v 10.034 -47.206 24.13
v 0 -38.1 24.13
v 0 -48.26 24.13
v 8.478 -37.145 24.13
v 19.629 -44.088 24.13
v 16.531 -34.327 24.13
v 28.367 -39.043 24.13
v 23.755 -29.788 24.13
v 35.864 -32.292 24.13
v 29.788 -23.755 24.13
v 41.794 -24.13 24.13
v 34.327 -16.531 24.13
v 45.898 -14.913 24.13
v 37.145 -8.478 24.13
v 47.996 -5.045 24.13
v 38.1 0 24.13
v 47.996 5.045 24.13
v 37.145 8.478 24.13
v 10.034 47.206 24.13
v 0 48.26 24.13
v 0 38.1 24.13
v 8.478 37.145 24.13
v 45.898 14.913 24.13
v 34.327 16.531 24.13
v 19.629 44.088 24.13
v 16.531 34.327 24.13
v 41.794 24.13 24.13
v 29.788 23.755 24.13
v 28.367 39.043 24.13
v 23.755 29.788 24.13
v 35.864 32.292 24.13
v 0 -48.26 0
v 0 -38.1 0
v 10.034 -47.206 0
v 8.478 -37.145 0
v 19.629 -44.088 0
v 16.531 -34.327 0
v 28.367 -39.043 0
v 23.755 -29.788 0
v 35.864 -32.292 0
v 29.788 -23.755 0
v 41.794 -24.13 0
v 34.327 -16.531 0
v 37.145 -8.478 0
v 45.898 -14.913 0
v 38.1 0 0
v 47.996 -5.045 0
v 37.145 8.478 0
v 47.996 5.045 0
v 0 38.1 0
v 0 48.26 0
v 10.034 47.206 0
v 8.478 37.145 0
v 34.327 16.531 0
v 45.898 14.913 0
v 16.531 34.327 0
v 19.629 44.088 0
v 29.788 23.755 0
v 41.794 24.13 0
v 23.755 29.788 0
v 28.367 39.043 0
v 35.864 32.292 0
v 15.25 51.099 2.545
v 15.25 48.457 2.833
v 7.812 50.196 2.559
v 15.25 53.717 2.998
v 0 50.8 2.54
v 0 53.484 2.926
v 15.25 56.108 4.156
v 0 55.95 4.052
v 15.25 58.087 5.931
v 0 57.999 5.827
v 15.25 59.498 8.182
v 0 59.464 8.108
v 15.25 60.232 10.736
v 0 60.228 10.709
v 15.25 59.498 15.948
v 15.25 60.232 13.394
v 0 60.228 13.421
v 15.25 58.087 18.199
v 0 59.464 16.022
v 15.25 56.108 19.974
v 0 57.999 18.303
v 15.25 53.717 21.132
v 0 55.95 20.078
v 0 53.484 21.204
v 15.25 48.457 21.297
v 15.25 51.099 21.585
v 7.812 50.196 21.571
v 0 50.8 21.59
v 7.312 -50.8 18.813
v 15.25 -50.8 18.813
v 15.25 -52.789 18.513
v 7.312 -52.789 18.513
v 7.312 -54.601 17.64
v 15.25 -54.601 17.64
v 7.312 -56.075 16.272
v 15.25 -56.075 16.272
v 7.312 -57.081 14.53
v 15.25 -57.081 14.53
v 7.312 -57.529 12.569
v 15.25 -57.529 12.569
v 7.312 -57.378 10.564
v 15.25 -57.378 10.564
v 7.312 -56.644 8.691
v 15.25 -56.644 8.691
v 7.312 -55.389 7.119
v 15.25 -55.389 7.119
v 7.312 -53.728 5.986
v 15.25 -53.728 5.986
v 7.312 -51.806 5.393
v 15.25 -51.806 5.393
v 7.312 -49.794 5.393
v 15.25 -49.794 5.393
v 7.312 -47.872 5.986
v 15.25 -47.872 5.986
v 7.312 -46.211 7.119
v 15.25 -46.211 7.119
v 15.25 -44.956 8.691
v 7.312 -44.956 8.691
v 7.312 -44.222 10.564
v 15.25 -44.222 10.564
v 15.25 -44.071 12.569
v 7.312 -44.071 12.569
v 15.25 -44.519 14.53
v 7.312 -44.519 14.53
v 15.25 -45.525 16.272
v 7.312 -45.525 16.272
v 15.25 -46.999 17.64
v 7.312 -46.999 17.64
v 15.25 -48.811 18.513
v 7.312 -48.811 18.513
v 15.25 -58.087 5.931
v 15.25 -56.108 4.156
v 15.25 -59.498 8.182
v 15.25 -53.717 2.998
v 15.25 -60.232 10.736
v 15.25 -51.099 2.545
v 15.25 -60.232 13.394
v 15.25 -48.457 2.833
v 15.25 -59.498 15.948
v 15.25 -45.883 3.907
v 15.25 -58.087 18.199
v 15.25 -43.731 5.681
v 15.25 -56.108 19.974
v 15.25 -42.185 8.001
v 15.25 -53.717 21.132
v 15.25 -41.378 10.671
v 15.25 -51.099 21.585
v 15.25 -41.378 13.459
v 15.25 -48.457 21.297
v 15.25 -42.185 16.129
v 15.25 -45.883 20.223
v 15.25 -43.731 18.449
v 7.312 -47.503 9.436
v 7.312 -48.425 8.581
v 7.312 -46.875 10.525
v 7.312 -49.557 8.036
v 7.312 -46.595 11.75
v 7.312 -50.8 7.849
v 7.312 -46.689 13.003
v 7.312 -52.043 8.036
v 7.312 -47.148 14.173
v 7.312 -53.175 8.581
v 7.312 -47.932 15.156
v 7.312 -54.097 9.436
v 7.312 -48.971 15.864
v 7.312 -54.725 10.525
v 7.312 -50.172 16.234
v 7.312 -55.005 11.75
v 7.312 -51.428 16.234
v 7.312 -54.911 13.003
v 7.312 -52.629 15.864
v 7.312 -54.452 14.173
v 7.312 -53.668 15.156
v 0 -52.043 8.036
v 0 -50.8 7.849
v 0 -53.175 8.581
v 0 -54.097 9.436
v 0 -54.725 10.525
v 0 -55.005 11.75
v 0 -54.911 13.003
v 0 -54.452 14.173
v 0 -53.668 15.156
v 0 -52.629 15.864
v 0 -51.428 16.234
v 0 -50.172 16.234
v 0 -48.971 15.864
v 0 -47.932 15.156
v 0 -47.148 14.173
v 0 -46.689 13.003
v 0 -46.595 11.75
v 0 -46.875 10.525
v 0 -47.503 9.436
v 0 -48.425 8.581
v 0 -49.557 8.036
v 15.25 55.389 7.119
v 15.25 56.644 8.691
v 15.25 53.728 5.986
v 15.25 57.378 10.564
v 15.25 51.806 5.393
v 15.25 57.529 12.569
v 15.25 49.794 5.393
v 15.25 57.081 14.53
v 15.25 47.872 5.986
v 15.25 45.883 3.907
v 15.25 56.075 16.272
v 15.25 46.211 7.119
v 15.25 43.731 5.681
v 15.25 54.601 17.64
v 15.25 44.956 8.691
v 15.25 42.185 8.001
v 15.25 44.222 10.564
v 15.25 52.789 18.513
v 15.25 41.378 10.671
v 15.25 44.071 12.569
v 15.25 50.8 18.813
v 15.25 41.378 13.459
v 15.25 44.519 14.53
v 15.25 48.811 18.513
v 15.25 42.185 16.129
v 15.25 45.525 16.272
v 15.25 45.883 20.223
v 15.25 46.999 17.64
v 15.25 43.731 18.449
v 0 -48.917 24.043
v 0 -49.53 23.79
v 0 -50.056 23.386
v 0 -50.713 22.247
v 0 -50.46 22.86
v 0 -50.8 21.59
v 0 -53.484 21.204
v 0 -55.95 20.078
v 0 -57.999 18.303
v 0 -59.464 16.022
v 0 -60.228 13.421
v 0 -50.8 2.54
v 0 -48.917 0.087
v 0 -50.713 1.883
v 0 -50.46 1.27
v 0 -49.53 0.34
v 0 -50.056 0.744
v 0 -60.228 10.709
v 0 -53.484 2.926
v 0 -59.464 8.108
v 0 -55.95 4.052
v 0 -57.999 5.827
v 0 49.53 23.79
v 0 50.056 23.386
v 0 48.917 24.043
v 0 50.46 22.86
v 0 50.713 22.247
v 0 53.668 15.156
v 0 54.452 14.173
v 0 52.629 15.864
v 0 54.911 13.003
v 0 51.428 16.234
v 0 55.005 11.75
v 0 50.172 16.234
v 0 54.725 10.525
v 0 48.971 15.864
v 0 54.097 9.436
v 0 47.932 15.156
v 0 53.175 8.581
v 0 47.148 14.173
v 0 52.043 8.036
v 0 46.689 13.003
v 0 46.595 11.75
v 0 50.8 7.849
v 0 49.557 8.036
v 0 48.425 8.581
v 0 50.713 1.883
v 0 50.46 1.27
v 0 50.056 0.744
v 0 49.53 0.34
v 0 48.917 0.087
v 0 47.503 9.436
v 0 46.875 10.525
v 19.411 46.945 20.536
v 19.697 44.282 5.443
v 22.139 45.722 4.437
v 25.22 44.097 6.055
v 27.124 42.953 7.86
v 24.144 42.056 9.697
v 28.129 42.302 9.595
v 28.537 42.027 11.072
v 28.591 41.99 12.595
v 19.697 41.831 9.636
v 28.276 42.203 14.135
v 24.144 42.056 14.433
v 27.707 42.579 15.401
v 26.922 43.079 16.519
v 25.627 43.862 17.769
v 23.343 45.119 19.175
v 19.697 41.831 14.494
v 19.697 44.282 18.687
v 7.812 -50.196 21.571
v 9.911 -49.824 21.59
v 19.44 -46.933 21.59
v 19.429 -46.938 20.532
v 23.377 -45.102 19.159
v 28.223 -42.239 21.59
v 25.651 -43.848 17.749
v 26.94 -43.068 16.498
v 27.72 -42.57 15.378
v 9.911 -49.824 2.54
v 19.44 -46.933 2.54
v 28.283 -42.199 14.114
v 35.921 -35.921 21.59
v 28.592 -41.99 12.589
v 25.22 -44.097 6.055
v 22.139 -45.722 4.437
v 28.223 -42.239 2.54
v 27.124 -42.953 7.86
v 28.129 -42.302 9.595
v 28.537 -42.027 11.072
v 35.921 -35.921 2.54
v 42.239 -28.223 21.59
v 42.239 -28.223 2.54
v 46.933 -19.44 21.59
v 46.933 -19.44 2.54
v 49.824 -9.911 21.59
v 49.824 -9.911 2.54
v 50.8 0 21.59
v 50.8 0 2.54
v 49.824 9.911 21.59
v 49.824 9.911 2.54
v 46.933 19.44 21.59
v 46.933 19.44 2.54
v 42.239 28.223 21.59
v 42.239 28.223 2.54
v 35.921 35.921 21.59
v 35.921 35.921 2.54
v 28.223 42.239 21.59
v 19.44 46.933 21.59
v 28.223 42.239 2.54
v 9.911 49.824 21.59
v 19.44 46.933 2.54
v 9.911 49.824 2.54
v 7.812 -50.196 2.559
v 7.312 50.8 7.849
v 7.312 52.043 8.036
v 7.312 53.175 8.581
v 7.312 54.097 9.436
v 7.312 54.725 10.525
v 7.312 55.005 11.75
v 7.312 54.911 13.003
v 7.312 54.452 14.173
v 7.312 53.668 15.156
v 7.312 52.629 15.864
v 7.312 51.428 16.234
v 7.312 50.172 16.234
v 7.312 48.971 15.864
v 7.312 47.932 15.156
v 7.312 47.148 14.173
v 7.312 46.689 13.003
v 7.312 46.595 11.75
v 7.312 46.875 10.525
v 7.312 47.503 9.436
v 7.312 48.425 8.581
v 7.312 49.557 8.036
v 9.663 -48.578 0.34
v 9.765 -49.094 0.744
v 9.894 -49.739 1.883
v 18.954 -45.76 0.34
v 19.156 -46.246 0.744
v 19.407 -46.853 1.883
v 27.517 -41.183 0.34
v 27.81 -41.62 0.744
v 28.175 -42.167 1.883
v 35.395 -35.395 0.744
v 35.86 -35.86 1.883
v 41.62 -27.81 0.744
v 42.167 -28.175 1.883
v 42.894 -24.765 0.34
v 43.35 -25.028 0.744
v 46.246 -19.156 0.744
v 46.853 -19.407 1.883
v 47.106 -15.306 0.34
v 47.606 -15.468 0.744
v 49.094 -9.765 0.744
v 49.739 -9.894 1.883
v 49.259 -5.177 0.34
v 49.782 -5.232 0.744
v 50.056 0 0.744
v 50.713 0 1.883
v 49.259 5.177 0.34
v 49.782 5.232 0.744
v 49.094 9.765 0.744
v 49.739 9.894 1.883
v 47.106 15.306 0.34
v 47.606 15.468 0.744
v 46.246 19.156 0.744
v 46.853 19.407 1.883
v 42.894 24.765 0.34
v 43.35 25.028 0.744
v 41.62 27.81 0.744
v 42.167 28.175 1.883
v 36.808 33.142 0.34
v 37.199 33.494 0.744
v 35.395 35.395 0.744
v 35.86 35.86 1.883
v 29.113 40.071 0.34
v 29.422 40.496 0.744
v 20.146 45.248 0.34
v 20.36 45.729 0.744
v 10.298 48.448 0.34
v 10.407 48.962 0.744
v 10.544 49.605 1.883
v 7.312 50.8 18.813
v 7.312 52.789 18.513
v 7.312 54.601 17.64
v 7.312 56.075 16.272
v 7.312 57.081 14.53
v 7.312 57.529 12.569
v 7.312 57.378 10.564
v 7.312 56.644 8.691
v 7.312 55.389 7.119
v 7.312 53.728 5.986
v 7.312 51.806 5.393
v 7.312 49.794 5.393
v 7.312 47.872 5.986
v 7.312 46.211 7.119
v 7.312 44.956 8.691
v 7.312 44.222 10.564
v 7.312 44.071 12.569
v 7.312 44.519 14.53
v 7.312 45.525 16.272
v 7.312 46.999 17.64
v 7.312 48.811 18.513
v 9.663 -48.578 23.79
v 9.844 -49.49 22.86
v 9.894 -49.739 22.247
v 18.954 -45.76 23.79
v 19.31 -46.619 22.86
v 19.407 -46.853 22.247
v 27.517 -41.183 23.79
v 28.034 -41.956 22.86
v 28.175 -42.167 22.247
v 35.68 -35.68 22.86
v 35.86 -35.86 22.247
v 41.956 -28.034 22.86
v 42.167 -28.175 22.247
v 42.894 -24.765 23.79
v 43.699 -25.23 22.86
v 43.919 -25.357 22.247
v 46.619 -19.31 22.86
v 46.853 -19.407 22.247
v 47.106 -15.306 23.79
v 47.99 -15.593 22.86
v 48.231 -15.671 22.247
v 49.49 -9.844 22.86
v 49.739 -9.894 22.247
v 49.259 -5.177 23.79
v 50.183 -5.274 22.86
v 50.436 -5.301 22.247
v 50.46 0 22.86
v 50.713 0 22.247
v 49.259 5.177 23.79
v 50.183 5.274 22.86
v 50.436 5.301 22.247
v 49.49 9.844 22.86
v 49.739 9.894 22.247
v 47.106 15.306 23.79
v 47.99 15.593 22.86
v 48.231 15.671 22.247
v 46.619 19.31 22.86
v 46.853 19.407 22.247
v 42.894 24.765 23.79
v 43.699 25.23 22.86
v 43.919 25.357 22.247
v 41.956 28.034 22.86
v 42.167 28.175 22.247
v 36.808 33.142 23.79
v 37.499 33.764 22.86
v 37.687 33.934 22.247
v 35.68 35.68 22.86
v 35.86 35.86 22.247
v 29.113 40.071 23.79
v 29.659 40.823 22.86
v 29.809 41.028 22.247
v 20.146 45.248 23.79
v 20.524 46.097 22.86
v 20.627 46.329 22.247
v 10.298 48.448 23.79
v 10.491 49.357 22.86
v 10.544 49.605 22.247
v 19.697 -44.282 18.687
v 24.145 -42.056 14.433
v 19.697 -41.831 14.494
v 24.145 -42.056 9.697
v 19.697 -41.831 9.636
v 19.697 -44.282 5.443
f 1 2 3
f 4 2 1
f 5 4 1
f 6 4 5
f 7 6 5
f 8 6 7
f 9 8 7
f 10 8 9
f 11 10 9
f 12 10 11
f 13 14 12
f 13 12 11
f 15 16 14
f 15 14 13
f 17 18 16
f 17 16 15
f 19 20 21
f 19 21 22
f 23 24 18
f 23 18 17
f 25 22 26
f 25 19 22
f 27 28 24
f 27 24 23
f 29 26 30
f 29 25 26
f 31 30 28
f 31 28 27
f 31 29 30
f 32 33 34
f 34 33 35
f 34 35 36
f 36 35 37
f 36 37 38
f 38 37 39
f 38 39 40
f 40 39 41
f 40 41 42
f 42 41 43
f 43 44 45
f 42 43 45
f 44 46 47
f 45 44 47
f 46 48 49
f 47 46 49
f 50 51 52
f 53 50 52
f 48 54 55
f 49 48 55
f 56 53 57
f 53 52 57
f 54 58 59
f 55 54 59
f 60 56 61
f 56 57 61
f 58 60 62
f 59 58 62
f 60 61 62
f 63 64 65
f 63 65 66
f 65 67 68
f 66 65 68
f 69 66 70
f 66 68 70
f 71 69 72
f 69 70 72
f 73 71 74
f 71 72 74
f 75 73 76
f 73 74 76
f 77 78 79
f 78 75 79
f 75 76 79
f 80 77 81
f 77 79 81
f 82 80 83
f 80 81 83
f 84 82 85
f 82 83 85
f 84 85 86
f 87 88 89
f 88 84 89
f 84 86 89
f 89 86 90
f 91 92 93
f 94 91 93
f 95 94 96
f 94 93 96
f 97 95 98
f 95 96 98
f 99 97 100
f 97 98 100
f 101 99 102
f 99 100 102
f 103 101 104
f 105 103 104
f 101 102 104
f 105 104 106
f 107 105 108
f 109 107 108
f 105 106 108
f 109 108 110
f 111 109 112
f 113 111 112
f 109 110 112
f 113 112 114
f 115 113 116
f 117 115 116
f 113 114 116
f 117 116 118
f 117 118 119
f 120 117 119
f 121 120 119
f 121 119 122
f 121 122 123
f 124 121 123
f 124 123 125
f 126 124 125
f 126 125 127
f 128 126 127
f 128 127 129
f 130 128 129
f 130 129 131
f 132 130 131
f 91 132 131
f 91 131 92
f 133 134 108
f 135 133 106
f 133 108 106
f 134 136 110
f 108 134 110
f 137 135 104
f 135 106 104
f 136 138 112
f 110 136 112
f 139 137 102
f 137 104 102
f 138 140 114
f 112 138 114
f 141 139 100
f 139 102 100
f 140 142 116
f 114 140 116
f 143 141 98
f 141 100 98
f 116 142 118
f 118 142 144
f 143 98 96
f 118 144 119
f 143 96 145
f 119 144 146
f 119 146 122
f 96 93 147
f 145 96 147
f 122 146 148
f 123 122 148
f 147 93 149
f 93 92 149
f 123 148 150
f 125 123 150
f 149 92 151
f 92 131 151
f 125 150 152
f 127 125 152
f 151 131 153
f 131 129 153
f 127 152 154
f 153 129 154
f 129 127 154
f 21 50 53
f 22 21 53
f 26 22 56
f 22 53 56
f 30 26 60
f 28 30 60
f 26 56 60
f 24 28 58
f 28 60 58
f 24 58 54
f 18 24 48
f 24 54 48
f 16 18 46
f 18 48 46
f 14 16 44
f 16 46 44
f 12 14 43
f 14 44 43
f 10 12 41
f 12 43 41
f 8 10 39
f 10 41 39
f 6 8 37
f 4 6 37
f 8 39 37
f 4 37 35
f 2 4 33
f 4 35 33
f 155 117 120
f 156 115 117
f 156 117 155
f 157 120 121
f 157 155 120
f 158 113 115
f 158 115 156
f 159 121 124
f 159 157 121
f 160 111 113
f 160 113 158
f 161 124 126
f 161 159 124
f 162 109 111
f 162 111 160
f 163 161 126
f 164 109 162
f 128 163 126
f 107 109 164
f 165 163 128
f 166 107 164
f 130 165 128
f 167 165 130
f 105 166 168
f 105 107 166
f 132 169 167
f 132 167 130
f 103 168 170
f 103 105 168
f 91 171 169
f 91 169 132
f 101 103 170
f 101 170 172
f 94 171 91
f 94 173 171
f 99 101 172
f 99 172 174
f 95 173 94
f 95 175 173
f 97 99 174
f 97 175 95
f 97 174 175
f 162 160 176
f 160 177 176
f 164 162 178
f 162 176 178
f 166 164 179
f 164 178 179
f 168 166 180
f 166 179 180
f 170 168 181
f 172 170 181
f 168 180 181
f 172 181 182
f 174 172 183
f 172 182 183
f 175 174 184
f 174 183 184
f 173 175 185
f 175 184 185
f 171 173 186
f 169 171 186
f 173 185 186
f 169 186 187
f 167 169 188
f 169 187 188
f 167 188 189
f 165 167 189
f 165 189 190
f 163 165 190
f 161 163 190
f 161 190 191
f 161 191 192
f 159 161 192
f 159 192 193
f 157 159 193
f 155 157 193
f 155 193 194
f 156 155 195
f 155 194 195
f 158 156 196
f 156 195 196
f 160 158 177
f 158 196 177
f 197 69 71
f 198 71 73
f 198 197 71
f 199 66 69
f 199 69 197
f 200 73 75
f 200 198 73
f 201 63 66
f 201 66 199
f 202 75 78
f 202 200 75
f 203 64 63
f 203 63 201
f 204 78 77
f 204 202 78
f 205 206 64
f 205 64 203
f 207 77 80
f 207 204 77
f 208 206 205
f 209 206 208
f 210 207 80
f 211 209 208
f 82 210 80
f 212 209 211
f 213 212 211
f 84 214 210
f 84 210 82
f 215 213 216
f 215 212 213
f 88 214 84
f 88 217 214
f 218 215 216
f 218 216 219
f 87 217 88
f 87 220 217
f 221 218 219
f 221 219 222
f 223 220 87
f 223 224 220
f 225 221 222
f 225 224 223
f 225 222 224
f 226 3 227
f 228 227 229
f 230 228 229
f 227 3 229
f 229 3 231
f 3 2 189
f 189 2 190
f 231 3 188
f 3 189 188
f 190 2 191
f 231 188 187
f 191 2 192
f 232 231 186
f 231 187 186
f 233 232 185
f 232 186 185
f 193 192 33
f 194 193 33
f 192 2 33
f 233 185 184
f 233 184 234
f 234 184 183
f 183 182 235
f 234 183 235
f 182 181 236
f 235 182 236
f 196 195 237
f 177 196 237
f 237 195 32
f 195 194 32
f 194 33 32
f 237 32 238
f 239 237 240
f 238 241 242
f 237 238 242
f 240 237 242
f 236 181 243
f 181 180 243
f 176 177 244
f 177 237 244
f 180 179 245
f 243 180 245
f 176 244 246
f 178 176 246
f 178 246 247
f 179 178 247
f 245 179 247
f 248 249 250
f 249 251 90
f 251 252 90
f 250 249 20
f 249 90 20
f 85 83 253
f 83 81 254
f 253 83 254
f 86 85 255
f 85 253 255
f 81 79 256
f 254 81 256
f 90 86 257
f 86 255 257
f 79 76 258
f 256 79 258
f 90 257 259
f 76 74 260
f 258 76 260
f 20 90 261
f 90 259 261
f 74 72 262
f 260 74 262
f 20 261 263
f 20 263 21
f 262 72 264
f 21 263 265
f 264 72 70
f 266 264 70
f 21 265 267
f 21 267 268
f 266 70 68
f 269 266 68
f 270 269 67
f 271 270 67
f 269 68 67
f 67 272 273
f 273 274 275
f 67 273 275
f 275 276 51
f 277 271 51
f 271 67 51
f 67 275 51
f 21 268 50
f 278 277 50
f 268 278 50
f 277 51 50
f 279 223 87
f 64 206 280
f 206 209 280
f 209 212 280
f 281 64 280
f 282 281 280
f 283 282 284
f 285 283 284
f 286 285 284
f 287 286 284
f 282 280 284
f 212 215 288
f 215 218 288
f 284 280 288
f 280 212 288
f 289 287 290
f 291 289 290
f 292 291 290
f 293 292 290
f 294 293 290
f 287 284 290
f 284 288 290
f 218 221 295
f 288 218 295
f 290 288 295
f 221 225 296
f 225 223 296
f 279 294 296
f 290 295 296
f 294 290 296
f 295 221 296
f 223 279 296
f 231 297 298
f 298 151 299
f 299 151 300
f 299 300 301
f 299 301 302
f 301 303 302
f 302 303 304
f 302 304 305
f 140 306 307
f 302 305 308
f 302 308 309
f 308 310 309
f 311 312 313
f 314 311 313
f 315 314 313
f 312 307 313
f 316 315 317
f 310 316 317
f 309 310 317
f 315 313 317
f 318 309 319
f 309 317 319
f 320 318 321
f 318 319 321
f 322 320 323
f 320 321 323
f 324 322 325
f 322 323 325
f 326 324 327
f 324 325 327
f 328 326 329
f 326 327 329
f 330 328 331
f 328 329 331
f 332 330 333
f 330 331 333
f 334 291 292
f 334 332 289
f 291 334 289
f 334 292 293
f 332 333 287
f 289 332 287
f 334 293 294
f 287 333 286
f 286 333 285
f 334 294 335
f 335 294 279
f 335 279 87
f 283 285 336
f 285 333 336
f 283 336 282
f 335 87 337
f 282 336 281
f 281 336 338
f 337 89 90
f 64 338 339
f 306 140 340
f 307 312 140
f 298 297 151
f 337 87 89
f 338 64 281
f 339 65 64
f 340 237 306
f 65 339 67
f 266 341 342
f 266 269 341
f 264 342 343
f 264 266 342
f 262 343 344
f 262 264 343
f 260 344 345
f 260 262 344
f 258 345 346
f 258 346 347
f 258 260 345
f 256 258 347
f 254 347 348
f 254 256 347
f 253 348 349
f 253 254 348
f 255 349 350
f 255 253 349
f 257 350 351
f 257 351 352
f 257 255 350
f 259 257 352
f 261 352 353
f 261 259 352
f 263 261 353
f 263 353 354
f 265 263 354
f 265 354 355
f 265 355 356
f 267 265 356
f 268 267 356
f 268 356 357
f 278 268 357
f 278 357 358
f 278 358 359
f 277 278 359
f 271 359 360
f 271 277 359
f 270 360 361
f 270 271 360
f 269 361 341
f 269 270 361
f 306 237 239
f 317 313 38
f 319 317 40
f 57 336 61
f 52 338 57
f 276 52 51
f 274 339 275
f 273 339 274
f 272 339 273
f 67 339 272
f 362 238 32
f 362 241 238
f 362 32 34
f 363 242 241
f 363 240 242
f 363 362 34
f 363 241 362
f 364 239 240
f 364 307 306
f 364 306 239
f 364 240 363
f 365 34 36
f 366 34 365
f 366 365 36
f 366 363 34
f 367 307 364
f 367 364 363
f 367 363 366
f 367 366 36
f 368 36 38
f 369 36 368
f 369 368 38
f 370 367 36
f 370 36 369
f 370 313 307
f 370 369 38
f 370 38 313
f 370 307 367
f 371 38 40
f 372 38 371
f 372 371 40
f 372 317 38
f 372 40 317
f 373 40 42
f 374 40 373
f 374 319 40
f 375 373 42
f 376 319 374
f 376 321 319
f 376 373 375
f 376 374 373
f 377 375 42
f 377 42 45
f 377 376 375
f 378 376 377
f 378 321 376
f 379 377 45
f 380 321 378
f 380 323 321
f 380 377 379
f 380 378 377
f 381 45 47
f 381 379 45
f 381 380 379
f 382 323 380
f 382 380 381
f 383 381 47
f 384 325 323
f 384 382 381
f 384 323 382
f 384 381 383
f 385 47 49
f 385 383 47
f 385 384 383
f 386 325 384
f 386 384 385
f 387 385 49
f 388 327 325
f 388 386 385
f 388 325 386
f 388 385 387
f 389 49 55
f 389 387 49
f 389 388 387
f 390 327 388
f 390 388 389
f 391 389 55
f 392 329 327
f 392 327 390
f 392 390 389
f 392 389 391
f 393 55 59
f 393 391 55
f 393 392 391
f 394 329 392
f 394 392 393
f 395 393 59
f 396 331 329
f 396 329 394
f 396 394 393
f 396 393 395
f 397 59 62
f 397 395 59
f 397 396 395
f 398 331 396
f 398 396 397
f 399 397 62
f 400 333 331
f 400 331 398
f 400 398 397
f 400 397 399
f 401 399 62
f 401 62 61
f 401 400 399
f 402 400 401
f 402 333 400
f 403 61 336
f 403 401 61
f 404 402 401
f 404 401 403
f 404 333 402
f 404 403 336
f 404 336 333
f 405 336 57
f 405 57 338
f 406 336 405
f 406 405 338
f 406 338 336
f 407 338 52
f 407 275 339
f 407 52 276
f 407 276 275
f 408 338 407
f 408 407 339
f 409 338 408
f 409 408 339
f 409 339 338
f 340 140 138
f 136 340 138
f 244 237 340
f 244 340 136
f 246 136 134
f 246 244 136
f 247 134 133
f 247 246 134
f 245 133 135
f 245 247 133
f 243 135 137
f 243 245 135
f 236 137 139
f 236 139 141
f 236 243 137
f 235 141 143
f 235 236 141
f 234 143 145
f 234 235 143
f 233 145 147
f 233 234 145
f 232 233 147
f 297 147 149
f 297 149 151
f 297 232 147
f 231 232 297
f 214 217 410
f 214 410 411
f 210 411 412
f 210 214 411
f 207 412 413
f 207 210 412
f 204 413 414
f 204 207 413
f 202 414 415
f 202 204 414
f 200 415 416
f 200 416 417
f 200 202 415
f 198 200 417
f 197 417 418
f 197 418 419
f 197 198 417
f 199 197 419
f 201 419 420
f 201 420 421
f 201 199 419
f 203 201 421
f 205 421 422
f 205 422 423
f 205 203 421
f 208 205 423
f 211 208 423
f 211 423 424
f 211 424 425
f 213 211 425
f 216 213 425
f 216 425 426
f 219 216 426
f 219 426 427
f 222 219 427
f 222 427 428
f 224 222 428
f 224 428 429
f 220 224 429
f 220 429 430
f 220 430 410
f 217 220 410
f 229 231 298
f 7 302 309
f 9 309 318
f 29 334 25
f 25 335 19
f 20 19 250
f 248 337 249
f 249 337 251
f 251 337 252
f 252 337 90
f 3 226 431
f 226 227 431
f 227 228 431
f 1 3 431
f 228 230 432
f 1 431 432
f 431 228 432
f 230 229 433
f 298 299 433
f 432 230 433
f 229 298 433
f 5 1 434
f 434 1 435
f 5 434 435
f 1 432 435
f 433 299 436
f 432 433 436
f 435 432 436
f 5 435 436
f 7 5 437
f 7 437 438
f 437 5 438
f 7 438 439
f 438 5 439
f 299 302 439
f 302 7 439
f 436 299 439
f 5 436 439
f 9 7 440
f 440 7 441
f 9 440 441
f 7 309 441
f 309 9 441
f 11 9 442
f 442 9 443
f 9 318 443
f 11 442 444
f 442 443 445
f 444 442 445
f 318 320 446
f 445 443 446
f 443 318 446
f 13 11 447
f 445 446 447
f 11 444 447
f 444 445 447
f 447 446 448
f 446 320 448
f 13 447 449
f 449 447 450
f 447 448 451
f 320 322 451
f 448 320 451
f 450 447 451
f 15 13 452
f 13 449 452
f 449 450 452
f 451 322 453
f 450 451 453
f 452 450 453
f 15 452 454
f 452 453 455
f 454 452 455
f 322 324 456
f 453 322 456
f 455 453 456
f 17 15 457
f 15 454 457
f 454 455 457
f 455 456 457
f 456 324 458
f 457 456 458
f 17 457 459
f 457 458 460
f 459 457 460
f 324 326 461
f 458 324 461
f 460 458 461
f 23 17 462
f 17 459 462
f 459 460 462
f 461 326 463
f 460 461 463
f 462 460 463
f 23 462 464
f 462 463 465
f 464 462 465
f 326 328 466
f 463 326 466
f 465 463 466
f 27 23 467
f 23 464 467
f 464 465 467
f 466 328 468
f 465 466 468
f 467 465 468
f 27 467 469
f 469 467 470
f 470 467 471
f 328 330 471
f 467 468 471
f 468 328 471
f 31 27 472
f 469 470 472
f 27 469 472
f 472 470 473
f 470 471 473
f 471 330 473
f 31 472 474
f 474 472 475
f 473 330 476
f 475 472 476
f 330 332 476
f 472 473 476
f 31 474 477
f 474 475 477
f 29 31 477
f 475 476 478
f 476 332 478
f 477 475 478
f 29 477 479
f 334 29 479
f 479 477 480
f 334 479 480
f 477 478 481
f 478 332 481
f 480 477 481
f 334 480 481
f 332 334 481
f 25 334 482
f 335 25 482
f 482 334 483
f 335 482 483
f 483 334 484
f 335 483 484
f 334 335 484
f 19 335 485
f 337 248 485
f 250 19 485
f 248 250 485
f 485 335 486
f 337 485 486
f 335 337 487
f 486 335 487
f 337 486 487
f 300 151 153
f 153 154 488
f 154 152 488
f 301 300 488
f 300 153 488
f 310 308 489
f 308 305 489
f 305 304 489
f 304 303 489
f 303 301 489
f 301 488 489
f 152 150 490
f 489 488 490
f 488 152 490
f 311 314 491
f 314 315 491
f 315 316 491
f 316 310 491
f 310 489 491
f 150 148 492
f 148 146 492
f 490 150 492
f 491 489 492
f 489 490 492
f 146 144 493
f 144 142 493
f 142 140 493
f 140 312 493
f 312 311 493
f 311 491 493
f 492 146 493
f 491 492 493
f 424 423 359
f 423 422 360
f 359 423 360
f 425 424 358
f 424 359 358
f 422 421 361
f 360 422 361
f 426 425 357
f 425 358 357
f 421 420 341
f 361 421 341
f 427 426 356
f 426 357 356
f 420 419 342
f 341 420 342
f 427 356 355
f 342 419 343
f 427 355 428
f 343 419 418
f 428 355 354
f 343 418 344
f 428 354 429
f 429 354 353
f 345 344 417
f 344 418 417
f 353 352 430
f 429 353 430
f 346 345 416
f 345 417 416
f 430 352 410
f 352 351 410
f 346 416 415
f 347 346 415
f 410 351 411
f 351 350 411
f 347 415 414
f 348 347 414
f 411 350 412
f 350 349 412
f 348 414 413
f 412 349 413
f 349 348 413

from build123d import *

# Parameters (mm, degrees)
BOSS_EXTRUDE1_DEPTH                               = 24.13
SKETCH2_R                                         = 9.525
BOSS_EXTRUDE2_DEPTH                               = 15.25
CUT_EXTRUDE1_START                                = -15.25
SKETCH2_3_R                                       = 9.525
CUT_EXTRUDE1_DEPTH                                = 15.25
CUT_EXTRUDE1_DRAFT                                = -3
CBORE_FOR_5_16_SOCKET_HEAD_CAP_SCREW2_D           = 8.4328
CBORE_FOR_5_16_SOCKET_HEAD_CAP_SCREW2_CBORE_D     = 13.49502
CBORE_FOR_5_16_SOCKET_HEAD_CAP_SCREW2_CBORE_DEPTH = 7.9375
MIRROR1_START                                     = -15.25
MIRROR1_COPY_1_SKETCH_R                           = 9.525
MIRROR1_COPY_1_DEPTH                              = 15.25
MIRROR1_COPY_1_DRAFT                              = -3
FILLET1_R                                         = 2.54


with BuildPart() as part:
    # Sketch1 → Boss-Extrude1 (new body)
    with BuildSketch(Plane.XY):
        with BuildLine():
            Line((0, 50.8), (0, 38.1))
            ThreePointArc((0, 38.1), (38.1, 0), (0, -38.1))
            Line((0, -38.1), (0, -50.8))
            ThreePointArc((0, -50.8), (50.8, 0), (0, 50.8))
        make_face()
    extrude(amount=BOSS_EXTRUDE1_DEPTH)

    # Sketch2 → Boss-Extrude2 (add)
    with BuildSketch(Plane.ZY):
        with Locations((12.065, -50.8)):
            Circle(SKETCH2_R)
    boss_extrude2 = extrude(amount=-BOSS_EXTRUDE2_DEPTH)


with BuildPart() as cut_extrude1_tool:
    # Sketch2<3> → Cut-Extrude1 (with draft: the straight prism first)
    with BuildSketch(Plane.ZY.offset(CUT_EXTRUDE1_START)):
        with Locations((12.065, -50.8)):
            Circle(SKETCH2_3_R)
    extrude(amount=-CUT_EXTRUDE1_DEPTH)
    # Cut-Extrude1: the draft: its side faces are tilted about the plane it starts from
    cut_extrude1_sides = [cut_extrude1_tool.faces().sort_by_distance(p)[0] for p in [
        (22.875, -50.8, 2.54),
    ]]
    draft(cut_extrude1_sides, Plane.ZY.offset(CUT_EXTRUDE1_START), CUT_EXTRUDE1_DRAFT)


with BuildPart() as part_1:
    add(part.part)

    # Cut-Extrude1: cut by cut_extrude1_tool
    add(cut_extrude1_tool.part, mode=Mode.SUBTRACT)

    # CBORE for 5/16 Socket Head Cap Screw2 (through all)
    with Locations(Plane(origin=(15.25, -50.8, 12.065), x_dir=(0, 0, 1), z_dir=(1, 0, 0))):
        with Locations((0, 0)):
            cbore_for_5_16_socket_head_cap_screw2 = CounterBoreHole(CBORE_FOR_5_16_SOCKET_HEAD_CAP_SCREW2_D / 2, CBORE_FOR_5_16_SOCKET_HEAD_CAP_SCREW2_CBORE_D / 2, CBORE_FOR_5_16_SOCKET_HEAD_CAP_SCREW2_CBORE_DEPTH)

    # Mirror1: Boss-Extrude2, CBORE for 5/16 Socket Head Cap Screw2 across plane
    add(boss_extrude2.mirror(Plane.ZX))
    add(cbore_for_5_16_socket_head_cap_screw2.mirror(Plane.ZX), mode=Mode.SUBTRACT)


with BuildPart() as mirror1_copy_1_tool:
    # Mirror1 copy 1 sketch → Mirror1 copy 1 (with draft: the straight prism first)
    with BuildSketch(Plane.ZY.offset(MIRROR1_START)):
        with Locations((12.065, 50.8)):
            Circle(MIRROR1_COPY_1_SKETCH_R)
    extrude(amount=-MIRROR1_COPY_1_DEPTH)
    # Mirror1 copy 1: the draft: its side faces are tilted about the plane it starts from
    mirror1_copy_1_sides = [mirror1_copy_1_tool.faces().sort_by_distance(p)[0] for p in [
        (22.875, 50.8, 2.54),
    ]]
    draft(mirror1_copy_1_sides, Plane.ZY.offset(MIRROR1_START), MIRROR1_COPY_1_DRAFT)


with BuildPart() as part_2:
    add(part_1.part)

    # Mirror1 copy 1: cut by mirror1_copy_1_tool
    add(mirror1_copy_1_tool.part, mode=Mode.SUBTRACT)

    # Fillet1
    fillet1_edges = [part_2.edges().sort_by_distance(p)[0] for p in [
        (50.8, 0, 24.13),
        (50.8, 0, 0),
    ]]
    fillet(fillet1_edges, radius=FILLET1_R - 0.0001)  # a hair under: the kernel refuses the full size


solid = part_2.part
